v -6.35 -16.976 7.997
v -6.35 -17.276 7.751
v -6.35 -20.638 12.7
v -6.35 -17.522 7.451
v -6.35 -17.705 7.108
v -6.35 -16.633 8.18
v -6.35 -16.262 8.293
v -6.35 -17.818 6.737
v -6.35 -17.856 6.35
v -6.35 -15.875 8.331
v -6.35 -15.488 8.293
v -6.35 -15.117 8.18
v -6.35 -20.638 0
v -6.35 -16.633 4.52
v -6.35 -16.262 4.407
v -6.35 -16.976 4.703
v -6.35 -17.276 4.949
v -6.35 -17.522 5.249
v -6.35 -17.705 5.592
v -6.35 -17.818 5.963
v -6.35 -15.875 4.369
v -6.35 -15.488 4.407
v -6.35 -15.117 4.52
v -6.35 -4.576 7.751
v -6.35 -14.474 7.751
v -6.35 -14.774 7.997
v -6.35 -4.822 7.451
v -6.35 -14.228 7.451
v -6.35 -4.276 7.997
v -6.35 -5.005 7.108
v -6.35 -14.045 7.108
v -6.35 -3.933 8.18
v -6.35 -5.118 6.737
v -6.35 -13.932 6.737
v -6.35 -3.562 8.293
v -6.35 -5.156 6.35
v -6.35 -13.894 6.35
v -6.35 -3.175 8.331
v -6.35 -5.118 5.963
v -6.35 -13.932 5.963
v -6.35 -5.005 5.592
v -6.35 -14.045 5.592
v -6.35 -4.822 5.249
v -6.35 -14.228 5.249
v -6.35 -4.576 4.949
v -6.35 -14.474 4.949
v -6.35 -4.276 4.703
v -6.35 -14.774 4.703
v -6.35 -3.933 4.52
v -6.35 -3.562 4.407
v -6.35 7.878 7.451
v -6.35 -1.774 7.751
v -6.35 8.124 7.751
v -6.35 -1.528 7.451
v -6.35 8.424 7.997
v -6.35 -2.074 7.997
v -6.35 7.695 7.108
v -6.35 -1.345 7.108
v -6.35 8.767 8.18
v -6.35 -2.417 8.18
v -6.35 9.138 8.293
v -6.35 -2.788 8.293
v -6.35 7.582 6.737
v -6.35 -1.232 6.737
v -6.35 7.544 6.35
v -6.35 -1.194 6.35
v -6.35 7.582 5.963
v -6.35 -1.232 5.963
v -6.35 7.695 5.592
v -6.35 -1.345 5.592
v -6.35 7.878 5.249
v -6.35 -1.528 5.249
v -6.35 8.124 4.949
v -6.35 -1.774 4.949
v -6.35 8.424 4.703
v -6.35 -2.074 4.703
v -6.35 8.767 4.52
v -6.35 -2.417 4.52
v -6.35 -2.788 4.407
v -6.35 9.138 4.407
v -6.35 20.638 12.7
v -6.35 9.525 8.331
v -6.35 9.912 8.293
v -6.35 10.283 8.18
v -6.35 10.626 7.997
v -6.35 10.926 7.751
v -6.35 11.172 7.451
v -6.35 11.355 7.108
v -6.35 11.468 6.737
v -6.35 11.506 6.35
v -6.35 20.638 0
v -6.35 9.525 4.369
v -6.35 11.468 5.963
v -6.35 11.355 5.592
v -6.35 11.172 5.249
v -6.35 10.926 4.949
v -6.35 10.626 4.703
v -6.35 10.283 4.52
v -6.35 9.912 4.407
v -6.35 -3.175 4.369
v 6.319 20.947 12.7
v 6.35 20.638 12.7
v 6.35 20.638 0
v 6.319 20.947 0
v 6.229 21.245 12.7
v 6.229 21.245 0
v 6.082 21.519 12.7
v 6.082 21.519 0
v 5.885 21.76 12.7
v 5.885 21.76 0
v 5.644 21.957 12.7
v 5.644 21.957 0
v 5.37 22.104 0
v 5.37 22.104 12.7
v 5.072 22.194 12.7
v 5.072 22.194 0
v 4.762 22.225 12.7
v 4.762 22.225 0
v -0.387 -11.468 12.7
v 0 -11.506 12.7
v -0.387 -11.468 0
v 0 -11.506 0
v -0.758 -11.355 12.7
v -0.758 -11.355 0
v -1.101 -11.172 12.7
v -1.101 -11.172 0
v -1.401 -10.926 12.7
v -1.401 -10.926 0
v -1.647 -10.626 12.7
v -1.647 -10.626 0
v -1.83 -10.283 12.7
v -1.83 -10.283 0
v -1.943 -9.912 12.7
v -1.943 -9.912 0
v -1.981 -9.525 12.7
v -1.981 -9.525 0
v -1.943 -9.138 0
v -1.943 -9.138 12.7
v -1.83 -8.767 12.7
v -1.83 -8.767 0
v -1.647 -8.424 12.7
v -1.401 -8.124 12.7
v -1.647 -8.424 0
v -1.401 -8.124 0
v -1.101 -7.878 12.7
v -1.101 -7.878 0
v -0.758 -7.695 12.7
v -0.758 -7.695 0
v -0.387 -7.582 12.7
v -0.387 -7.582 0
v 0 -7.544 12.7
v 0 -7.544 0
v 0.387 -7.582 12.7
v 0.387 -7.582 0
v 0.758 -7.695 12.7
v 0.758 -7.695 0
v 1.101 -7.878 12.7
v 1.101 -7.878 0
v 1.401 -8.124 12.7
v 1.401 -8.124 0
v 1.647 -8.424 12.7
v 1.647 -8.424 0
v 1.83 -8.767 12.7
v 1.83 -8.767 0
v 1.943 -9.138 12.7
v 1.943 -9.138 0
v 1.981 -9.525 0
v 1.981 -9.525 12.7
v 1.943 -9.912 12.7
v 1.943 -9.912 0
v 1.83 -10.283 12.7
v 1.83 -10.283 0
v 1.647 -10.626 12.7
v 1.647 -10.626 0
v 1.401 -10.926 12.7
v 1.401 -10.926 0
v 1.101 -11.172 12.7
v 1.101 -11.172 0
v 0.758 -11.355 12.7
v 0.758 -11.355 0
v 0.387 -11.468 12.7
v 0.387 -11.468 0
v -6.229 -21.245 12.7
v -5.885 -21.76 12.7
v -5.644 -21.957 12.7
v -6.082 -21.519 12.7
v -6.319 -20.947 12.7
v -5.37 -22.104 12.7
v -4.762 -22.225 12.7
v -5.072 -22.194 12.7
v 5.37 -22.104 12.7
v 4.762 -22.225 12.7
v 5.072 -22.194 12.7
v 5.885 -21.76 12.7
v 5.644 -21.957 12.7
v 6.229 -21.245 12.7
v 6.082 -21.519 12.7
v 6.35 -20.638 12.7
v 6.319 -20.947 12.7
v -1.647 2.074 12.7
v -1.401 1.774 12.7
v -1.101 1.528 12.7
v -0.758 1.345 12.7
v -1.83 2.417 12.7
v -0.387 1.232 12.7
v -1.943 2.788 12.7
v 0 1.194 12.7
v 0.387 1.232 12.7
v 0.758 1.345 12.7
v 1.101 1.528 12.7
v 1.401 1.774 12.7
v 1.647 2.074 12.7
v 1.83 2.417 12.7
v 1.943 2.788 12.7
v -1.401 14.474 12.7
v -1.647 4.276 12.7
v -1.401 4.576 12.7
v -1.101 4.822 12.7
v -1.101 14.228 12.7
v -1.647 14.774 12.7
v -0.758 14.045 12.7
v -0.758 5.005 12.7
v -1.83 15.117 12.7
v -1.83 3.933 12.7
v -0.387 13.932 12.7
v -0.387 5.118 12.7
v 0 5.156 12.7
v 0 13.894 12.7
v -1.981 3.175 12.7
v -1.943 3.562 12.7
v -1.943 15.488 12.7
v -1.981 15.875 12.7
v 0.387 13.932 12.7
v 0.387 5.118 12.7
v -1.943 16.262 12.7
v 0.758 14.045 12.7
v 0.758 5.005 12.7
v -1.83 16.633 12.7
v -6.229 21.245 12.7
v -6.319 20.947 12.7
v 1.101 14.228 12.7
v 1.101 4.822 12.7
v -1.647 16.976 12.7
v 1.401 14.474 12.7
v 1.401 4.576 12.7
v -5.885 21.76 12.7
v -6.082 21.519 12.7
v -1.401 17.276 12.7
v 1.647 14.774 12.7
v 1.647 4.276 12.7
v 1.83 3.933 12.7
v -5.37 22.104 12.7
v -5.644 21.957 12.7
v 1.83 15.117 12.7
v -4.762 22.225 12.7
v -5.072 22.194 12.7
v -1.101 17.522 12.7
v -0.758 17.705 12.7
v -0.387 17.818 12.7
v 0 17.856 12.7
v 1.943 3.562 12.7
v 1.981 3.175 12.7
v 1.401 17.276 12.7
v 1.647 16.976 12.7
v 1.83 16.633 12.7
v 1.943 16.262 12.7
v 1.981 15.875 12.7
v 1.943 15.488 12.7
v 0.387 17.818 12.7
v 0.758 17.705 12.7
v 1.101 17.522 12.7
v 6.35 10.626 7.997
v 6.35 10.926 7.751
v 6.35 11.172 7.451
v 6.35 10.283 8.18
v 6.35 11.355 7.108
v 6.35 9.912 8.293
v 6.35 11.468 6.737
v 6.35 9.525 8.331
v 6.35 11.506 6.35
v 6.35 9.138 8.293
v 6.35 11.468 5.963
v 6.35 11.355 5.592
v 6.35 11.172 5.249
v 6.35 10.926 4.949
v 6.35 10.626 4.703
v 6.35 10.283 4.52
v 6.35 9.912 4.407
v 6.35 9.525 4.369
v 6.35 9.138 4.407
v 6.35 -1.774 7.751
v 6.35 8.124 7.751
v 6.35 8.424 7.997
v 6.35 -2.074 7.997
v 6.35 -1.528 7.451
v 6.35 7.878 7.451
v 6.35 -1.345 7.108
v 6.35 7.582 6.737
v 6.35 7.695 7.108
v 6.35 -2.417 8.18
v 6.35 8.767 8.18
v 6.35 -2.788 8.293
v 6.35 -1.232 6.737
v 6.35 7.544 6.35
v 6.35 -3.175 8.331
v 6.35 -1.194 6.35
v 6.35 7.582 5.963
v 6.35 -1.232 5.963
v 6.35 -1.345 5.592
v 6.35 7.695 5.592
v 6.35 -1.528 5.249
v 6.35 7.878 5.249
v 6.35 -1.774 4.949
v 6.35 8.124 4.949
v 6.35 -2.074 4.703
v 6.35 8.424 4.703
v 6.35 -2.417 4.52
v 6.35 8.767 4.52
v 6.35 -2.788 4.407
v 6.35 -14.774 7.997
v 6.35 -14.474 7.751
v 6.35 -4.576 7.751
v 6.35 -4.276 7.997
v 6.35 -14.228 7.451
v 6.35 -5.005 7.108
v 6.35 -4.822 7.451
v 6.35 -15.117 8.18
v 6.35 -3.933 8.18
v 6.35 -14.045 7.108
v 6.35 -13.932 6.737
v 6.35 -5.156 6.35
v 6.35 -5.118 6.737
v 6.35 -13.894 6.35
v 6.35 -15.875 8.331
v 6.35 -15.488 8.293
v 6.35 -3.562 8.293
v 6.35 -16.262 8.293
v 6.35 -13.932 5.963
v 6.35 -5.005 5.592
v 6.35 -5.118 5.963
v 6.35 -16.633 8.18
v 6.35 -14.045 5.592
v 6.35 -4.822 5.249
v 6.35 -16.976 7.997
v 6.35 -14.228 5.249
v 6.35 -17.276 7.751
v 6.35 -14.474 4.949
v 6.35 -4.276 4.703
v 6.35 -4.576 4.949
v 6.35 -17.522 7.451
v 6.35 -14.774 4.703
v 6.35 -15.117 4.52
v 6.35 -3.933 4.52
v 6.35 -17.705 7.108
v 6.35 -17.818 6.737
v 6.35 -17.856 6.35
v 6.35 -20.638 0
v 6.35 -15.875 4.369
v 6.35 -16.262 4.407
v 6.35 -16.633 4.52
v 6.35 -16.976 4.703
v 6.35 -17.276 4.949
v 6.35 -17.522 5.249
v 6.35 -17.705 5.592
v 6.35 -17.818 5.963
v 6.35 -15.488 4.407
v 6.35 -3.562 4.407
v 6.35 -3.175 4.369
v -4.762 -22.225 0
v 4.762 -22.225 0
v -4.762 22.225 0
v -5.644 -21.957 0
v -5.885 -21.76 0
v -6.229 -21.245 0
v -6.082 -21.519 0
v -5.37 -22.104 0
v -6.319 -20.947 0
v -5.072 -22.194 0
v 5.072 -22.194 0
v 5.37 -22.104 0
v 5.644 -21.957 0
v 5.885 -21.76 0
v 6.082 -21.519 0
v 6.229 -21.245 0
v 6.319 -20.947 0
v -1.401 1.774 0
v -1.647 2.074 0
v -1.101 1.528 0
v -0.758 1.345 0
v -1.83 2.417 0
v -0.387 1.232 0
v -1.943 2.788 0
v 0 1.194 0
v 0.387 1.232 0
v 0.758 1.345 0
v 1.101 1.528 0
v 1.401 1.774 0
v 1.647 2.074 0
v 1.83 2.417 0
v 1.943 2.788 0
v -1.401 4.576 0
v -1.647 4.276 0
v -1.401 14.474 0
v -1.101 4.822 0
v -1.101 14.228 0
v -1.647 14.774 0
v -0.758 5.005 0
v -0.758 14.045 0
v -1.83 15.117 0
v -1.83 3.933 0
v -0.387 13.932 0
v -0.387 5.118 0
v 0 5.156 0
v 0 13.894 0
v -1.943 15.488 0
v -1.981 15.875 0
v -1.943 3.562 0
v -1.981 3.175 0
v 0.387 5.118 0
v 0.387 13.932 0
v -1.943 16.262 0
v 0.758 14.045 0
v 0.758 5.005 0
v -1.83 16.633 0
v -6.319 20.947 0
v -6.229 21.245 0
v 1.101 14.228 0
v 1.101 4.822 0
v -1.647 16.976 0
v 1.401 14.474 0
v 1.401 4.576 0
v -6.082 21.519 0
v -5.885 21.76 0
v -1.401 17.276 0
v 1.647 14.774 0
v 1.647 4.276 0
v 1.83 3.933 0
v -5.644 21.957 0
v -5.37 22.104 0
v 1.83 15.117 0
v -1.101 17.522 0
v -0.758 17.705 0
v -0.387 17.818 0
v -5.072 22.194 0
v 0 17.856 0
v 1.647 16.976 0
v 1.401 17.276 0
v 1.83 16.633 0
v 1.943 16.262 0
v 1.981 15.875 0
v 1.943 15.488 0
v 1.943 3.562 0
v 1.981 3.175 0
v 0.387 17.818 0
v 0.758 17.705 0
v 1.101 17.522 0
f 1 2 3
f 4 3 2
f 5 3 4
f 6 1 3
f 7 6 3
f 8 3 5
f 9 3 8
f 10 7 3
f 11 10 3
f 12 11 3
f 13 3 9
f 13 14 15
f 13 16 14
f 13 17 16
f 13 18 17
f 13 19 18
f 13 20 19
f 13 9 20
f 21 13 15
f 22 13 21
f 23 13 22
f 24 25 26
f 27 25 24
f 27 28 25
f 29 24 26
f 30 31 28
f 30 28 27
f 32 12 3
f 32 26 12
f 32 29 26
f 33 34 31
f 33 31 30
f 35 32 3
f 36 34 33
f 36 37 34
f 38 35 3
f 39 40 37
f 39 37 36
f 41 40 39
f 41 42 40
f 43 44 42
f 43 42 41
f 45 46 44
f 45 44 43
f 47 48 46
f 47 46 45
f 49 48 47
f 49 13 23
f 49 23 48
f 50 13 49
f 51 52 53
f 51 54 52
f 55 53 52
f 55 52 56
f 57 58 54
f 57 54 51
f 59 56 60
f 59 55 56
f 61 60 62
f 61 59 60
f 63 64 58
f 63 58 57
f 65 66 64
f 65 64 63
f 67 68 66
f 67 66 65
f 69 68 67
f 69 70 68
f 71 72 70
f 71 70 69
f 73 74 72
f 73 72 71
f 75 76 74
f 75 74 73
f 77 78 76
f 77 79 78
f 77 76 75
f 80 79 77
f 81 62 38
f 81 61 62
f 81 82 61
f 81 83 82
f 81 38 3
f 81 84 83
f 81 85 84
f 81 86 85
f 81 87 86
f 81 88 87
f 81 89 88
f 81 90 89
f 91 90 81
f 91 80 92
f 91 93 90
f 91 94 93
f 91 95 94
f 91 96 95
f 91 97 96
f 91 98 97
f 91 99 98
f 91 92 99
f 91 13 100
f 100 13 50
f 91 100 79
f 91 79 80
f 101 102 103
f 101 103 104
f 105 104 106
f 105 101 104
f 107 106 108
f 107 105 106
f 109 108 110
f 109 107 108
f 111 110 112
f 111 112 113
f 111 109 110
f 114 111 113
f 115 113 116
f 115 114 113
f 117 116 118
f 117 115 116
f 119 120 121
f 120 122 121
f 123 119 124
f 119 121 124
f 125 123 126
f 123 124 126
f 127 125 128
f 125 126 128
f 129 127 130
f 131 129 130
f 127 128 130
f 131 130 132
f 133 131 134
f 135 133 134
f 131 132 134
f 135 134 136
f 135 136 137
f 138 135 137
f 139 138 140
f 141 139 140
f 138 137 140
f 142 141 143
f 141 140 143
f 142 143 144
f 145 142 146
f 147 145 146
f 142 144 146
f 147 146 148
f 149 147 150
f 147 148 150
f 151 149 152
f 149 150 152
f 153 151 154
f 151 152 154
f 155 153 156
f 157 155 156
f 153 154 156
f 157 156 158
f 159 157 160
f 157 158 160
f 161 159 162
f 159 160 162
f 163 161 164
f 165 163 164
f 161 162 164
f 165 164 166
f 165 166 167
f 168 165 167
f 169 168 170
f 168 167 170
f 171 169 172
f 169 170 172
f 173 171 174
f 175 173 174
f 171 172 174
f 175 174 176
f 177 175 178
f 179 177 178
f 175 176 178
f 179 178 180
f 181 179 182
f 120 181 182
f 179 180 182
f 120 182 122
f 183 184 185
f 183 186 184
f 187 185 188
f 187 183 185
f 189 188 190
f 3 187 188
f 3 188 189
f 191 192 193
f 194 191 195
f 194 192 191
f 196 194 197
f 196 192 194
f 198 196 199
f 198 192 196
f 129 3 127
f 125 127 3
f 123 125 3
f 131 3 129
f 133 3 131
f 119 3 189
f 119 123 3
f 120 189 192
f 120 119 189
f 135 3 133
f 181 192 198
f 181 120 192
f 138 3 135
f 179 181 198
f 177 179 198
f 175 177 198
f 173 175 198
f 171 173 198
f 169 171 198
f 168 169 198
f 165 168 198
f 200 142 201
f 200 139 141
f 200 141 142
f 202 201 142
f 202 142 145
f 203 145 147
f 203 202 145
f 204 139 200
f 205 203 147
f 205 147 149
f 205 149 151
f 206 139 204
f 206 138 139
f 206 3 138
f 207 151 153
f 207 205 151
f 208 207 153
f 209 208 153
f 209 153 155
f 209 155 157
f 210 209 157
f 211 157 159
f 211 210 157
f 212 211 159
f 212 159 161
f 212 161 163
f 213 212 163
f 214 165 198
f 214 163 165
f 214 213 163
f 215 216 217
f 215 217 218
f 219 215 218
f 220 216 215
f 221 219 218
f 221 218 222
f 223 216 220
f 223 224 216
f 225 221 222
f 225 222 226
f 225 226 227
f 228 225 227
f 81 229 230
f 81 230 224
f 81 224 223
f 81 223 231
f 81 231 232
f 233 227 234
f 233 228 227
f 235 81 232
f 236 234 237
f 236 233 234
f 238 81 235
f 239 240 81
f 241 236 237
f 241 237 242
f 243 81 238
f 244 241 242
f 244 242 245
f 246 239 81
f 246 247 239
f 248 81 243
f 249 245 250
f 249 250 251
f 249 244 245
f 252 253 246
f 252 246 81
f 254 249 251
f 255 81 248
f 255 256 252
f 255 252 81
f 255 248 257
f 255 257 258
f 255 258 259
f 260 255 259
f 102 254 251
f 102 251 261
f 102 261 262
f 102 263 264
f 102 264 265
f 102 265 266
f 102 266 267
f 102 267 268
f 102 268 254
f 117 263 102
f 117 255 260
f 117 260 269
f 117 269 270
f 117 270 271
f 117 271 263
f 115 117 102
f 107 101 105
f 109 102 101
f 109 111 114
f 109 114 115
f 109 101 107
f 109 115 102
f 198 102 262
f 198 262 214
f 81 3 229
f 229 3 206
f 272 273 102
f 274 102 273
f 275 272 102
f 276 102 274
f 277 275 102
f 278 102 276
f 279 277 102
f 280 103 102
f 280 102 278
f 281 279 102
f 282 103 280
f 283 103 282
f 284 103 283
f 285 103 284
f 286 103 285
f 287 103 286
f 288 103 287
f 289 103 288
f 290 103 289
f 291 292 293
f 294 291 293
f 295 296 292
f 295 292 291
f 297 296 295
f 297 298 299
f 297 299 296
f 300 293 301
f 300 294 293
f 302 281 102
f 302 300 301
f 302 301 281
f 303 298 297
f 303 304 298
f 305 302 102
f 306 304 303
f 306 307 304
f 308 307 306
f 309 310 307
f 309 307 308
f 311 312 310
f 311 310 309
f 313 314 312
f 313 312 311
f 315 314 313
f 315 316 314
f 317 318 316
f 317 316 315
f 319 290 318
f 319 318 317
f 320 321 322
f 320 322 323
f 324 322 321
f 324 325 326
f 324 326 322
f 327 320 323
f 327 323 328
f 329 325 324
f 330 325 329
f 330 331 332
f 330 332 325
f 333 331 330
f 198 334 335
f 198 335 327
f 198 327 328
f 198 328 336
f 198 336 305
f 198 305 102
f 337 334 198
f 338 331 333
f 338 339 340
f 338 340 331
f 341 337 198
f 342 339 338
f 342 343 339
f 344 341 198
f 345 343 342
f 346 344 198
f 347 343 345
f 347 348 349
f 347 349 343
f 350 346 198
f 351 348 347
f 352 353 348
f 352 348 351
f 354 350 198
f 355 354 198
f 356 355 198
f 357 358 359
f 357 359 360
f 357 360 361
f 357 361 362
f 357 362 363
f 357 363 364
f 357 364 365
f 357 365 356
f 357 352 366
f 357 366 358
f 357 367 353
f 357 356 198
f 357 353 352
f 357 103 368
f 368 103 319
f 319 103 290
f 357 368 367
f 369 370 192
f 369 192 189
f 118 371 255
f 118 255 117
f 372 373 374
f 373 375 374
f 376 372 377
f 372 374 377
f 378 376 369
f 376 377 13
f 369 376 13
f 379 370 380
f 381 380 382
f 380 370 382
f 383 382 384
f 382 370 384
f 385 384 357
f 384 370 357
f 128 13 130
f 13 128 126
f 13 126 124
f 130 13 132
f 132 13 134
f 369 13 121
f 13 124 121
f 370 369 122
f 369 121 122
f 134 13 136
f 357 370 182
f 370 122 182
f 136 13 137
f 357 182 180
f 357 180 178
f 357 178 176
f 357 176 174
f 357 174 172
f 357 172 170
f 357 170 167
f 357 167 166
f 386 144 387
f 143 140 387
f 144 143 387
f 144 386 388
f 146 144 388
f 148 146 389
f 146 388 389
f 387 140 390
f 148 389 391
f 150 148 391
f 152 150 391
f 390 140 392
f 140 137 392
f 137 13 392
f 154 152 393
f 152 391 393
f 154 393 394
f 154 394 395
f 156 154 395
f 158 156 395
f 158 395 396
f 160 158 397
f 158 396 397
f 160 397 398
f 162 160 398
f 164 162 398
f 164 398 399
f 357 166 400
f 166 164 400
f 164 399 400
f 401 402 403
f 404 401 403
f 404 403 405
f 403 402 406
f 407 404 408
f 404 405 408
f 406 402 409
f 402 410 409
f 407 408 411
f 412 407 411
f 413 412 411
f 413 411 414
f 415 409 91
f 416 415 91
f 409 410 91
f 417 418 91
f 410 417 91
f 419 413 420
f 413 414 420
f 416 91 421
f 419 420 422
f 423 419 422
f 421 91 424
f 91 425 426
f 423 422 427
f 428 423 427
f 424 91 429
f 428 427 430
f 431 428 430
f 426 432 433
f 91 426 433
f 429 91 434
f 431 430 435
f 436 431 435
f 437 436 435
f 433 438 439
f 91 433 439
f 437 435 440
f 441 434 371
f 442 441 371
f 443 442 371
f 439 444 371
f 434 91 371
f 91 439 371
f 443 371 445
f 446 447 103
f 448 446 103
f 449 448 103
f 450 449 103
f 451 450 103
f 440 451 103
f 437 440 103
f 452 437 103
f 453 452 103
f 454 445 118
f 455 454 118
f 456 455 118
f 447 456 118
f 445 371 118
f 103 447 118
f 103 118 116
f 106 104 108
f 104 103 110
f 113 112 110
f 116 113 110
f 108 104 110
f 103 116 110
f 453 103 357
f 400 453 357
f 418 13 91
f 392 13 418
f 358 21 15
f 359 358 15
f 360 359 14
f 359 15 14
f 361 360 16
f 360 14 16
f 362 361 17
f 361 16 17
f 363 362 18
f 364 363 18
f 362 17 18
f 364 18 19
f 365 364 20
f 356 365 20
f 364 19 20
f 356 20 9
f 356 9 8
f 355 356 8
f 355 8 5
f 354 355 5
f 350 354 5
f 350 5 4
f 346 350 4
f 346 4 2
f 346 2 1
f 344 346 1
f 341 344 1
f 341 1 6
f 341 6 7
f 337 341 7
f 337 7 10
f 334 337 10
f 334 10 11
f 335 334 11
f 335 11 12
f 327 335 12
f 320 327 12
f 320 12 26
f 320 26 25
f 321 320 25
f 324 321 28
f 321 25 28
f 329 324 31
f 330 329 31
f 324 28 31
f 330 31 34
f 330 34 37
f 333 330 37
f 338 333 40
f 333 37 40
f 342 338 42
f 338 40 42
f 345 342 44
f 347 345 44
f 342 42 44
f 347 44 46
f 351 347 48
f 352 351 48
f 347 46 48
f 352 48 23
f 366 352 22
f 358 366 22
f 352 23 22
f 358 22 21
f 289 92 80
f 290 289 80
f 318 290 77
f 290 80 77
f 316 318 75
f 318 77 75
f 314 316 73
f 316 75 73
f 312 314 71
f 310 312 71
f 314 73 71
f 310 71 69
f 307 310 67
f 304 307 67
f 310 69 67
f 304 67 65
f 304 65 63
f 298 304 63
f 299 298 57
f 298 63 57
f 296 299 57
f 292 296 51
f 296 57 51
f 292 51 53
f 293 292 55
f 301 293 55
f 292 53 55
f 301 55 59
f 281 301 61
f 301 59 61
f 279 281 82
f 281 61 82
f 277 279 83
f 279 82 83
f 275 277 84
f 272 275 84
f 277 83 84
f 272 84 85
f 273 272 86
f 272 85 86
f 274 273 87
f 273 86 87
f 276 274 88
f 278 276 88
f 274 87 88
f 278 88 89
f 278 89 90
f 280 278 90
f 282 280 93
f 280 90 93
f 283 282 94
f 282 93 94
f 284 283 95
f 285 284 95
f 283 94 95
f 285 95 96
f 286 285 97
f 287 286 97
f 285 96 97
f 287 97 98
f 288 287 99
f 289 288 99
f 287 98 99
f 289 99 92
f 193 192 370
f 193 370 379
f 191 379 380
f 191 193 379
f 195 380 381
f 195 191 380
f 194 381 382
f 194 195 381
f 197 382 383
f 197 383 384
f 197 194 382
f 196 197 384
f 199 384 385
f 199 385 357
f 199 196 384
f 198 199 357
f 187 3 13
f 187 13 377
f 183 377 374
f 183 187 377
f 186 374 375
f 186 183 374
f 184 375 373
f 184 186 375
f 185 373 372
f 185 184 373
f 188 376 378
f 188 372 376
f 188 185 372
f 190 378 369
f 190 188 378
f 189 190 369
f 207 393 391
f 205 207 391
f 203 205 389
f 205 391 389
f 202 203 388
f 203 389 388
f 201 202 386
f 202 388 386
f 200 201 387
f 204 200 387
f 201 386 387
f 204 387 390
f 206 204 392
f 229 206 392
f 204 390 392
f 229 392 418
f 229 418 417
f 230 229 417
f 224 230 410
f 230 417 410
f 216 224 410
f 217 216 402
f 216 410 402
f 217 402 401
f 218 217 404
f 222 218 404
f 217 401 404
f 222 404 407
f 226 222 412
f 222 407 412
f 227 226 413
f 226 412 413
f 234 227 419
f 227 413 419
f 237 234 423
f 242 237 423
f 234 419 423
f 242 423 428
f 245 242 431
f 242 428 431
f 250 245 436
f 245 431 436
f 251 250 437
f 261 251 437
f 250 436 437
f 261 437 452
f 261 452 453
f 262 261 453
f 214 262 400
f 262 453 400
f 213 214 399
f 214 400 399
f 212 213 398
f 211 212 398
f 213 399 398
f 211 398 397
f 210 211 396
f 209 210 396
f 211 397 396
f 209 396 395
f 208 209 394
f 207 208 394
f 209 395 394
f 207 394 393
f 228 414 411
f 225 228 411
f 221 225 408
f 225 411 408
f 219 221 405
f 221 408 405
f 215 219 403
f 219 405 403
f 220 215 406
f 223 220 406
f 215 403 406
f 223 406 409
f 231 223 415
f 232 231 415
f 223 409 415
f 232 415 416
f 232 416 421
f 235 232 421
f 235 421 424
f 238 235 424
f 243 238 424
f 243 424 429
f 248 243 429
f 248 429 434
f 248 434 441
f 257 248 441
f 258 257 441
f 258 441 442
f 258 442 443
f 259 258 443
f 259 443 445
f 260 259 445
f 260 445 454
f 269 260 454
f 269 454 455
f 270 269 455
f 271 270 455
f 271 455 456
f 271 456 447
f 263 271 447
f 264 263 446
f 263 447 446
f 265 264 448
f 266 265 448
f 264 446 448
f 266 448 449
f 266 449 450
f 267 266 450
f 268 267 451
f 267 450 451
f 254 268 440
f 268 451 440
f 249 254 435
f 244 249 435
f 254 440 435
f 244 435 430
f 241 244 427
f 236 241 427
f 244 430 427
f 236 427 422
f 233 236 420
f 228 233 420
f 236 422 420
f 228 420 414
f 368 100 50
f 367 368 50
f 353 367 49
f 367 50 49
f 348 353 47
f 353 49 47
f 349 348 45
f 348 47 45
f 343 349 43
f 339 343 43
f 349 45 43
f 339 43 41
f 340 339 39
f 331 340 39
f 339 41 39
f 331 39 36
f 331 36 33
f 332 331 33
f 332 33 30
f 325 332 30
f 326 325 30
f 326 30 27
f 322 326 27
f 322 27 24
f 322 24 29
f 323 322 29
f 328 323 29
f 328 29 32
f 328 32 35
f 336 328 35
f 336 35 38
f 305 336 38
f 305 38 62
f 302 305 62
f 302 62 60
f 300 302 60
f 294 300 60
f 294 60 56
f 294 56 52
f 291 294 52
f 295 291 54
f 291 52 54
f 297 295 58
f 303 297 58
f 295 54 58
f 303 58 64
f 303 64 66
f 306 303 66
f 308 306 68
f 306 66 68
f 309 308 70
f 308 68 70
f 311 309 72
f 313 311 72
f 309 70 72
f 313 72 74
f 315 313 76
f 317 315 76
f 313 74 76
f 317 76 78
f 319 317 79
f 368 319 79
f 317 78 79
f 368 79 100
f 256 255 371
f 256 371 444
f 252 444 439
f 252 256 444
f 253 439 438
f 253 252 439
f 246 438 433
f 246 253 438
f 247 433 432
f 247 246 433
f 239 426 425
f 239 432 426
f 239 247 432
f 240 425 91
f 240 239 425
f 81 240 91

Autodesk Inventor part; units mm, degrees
ref_plane "YZ Plane" through (0, 0, 0) normal (1, 0, 0) x (0, 1, 0)
ref_plane "XZ Plane" through (0, 0, 0) normal (0, 1, 0) x (-1, 0, 0)
ref_plane "XY Plane" through (0, 0, 0) normal (0, 0, 1) x (1, 0, 0)
sketch "Sketch1" plane through (0, 0, 0) normal (0, 0, 1) x (1, 0, 0)
  line L0 (6.35, -22.225) -> (-6.35, -22.225)
  line L1 (-6.35, -22.225) -> (-6.35, 22.225)
  line L2 (-6.35, 22.225) -> (6.35, 22.225)
  line L3 (6.35, 22.225) -> (6.35, -22.225)
  line L4 (6.35, -22.225) -> (-6.35, 22.225) construction
  line L5 (-6.35, -22.225) -> (6.35, 22.225) construction
  point P0 (0, 0)
  dimension "d0" = 12.7
  dimension "d6" = 44.45
extrude "Plate1" add sketch "Sketch1" along normal blind 12.7
sketch "Sketch2" plane through (6.35, -22.225, 0) normal (1, 0, 0) x (0, 0, -1)
  line L0 (0, 0) -> (-12.7, 0) projected
  line L1 (0, 0) -> (0, 44.45) projected
  point P0 (0, 22.225)
  point P1 (-6.35, 6.35)
  point P2 (-6.35, 19.05)
  point P3 (-6.35, 31.75)
  dimension "d2" = 6.35
  dimension "d3" = 12.7
  dimension "d4" = 12.7
  dimension "d5" = 6.35
hole "Hole1" at (6.35, -15.875, 6.35) at (6.35, -3.175, 6.35) at (6.35, 9.525, 6.35) direction (-1, 0, 0) diameter 3.9624 depth 12.7 tip angle 118 thread size "10-32 UNF" class "2B" standard "ANSI Unified Screw Threads"
sketch "Sketch3" plane through (0, 0, 12.7) normal (0, 0, 1) x (1, 0, 0)
  line L0 (-6.35, 22.225) -> (6.35, 22.225) projected
  point P0 (0, 0)
  point P1 (0, -9.525)
  point P2 (0, 3.175)
  point P3 (0, 15.875)
  dimension "d14" = 12.7
  dimension "d15" = 12.7
  dimension "d16" = 6.35
hole "Hole2" at (0, -9.525, 12.7) at (0, 3.175, 12.7) at (0, 15.875, 12.7) direction (0, 0, -1) diameter 3.9624 depth 12.7 tip angle 118 thread size "10-32 UNF" class "2B" standard "ANSI Unified Screw Threads"
fillet "Corner Round1" radius 1.5875 4 edges at (6.35, -22.225, 6.35) (-6.35, -22.225, 6.35) (6.35, 22.225, 6.35) (-6.35, 22.225, 6.35)
equation "\"d22\" = Thickness"
equation "\"d1\" = Thickness"
equation "\"BendRadius\" = Thickness"
equation "\"BendReliefWidth\" = Thickness"
equation "\"BendReliefDepth\" = 0.5 * Thickness"
equation "\"CornerReliefSize\" = 4 * Thickness"
equation "\"MinimumRemnant\" = 2 * Thickness"
equation "\"TransitionRadius\" = BendRadius"
equation "\"JacobiRadiusSize\" = BendRadius"
equation "\"GapSize\" = Thickness"
equation "\"Thickness\" = 12.7"
properties part number "PLATE,NUT-BLOCK,3-LONG" material "Aluminum 6061"
